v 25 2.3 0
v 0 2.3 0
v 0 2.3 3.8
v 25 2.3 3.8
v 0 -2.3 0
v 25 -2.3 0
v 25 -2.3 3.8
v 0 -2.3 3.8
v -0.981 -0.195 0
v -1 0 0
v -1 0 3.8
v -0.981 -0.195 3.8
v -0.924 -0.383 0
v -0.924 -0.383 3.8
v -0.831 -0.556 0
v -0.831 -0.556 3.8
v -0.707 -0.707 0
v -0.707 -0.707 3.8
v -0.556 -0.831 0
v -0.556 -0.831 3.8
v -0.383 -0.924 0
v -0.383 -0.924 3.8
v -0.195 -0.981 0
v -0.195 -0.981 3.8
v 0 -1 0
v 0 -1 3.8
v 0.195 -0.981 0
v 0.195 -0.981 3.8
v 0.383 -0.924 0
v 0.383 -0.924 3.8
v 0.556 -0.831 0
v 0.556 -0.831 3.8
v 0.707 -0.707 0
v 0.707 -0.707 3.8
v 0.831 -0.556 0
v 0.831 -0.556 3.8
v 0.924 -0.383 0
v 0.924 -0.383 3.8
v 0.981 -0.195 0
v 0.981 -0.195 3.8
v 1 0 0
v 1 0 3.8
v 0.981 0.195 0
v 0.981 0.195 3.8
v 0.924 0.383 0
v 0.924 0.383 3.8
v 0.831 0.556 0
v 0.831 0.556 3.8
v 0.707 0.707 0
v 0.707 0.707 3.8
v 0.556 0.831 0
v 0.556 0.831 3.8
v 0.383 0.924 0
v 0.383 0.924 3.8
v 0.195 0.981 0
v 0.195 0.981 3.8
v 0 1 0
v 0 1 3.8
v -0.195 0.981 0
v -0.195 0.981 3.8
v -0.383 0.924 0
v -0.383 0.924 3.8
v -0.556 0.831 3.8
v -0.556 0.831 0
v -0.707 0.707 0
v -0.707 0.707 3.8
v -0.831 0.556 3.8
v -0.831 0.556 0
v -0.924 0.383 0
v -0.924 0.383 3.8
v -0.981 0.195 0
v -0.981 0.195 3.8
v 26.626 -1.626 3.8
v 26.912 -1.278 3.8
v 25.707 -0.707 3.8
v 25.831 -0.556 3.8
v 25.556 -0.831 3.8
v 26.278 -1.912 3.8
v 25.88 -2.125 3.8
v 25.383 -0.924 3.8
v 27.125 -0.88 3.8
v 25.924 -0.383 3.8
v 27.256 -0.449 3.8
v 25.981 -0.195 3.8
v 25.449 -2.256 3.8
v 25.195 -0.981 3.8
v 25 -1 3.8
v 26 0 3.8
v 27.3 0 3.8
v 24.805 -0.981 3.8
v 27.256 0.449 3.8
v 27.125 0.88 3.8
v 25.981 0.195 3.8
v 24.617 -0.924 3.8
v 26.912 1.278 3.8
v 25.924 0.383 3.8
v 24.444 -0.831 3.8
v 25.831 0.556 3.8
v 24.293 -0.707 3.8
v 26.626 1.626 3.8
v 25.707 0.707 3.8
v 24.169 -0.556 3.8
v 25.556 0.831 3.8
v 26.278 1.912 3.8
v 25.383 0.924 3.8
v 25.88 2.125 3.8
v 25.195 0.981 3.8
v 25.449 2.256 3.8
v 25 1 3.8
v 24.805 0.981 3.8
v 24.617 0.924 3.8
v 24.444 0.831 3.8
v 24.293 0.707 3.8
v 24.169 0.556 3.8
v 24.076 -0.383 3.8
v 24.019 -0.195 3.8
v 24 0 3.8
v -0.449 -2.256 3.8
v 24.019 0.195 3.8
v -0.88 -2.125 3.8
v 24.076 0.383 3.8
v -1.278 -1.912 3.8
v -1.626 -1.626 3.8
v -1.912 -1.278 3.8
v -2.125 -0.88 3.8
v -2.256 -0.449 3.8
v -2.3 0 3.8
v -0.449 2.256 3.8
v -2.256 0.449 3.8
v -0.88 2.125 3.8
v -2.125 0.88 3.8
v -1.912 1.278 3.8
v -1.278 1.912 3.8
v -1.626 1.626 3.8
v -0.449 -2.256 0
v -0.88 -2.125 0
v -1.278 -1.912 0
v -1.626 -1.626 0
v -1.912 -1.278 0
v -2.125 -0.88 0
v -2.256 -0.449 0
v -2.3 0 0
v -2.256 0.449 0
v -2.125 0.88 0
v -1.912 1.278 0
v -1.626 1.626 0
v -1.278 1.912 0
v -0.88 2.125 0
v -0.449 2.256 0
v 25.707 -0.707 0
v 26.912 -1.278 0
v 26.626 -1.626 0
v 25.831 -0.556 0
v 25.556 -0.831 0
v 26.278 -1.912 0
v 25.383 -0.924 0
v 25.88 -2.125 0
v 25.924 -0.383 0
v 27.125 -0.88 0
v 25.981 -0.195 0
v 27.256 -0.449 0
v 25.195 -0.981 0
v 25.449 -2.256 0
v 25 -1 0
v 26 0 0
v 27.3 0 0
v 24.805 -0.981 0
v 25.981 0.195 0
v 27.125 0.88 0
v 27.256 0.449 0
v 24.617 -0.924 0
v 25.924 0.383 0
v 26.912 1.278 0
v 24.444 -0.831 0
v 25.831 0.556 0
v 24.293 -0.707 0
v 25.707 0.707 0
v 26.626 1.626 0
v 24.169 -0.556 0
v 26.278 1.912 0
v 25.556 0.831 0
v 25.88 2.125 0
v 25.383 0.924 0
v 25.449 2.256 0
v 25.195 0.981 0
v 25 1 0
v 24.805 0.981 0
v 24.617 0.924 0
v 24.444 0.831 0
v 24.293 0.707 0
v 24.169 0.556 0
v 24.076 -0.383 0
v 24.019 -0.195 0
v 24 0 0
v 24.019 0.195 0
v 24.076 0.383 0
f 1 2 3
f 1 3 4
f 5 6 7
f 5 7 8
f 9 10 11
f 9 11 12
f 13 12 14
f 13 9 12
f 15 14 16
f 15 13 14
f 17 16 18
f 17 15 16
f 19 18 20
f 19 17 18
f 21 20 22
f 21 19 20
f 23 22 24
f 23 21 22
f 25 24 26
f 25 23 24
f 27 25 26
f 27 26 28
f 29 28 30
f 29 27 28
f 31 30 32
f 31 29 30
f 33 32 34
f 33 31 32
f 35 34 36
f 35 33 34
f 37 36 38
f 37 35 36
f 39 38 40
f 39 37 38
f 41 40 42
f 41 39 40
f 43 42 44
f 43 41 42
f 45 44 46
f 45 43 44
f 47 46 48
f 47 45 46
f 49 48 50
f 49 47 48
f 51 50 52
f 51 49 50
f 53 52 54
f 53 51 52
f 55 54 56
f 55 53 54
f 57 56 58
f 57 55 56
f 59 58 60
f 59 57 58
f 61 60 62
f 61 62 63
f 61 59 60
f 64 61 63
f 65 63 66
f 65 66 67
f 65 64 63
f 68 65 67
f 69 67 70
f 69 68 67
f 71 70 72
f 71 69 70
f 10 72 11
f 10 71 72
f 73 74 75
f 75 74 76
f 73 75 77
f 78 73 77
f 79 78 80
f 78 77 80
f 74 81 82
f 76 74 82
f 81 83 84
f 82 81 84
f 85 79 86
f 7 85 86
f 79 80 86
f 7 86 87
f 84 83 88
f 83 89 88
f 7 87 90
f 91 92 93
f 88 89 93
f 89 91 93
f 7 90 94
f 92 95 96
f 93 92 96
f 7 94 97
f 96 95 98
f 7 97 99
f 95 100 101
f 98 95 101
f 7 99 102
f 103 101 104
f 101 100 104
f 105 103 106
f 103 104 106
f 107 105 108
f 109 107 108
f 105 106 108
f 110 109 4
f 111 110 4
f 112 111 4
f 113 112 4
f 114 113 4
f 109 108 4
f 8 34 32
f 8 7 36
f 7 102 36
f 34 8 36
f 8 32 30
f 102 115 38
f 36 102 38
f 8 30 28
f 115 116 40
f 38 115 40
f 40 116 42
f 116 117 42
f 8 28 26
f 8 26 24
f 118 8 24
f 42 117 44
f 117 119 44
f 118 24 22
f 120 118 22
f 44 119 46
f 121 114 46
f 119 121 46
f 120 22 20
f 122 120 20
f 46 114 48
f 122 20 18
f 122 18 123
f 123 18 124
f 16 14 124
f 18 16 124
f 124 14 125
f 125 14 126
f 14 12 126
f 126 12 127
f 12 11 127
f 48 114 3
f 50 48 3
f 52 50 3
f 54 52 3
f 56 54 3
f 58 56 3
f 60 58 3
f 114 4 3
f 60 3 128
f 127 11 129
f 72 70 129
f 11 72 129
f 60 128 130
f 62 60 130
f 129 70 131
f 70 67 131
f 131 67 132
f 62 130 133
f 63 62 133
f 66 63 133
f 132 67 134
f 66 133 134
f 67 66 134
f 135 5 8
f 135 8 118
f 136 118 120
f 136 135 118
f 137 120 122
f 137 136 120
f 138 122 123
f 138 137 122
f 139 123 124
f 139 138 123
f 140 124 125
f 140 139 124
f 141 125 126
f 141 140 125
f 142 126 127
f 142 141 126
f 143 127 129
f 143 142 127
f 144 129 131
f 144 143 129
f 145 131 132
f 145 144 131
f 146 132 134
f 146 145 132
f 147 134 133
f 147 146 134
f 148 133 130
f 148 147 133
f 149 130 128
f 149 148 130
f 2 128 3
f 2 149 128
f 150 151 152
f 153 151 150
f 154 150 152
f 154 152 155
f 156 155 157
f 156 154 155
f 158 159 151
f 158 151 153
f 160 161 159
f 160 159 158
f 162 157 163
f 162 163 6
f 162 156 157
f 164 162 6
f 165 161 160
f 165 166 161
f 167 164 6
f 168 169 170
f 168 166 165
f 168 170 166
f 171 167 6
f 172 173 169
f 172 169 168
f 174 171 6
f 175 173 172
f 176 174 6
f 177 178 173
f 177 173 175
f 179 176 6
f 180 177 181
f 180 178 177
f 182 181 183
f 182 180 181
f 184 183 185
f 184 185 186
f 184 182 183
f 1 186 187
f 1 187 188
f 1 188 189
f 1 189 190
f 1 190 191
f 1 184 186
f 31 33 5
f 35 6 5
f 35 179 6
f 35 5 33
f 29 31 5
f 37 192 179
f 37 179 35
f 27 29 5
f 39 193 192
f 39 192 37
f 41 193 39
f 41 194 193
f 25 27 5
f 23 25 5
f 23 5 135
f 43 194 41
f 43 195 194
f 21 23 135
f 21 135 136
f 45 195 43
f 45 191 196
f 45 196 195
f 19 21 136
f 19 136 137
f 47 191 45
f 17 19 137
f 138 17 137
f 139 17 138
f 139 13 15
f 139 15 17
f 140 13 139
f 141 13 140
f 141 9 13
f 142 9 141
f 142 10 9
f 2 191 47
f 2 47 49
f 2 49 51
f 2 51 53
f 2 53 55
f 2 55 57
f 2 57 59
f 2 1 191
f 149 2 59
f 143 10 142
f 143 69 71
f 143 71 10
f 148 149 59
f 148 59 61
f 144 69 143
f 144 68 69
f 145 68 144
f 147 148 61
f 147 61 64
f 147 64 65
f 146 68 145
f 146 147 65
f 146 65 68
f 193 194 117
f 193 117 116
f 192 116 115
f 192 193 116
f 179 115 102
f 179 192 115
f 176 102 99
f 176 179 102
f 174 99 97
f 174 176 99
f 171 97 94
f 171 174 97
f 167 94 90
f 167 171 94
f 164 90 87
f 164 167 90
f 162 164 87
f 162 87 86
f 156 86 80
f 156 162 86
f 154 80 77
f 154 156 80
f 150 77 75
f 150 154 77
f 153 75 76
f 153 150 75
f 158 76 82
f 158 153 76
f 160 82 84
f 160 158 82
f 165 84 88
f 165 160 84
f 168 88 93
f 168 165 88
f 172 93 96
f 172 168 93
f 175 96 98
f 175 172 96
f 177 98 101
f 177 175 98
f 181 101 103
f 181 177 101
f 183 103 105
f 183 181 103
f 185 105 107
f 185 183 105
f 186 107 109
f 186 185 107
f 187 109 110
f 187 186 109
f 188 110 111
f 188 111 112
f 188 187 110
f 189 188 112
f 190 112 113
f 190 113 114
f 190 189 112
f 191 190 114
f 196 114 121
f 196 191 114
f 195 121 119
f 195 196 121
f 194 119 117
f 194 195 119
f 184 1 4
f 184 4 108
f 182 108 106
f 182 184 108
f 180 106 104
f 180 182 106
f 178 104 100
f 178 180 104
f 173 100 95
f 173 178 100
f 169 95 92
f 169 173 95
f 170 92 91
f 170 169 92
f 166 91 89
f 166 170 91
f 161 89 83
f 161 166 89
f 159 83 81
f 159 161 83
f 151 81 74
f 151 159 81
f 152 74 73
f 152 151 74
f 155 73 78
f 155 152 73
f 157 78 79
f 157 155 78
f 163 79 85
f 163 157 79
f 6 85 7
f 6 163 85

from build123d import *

# Parameters (mm, degrees)
SKETCH1_R           = 1
BOSS_EXTRUDE1_DEPTH = 3.8


with BuildPart() as part:
    # Sketch1 → Boss-Extrude1 (new body)
    with BuildSketch(Plane.XY):
        with BuildLine():
            Line((0, 2.3), (25, 2.3))
            ThreePointArc((25, 2.3), (27.3, 0), (25, -2.3))
            Line((25, -2.3), (0, -2.3))
            ThreePointArc((0, -2.3), (-2.3, 0), (0, 2.3))
        make_face()
        with Locations(Location((0, 0, 0), (0, 0, 180))):
            Circle(SKETCH1_R, mode=Mode.SUBTRACT)
        with Locations(Location((25, 0, 0), (0, 0, 180))):
            Circle(SKETCH1_R, mode=Mode.SUBTRACT)
    extrude(amount=BOSS_EXTRUDE1_DEPTH)


solid = part.part
